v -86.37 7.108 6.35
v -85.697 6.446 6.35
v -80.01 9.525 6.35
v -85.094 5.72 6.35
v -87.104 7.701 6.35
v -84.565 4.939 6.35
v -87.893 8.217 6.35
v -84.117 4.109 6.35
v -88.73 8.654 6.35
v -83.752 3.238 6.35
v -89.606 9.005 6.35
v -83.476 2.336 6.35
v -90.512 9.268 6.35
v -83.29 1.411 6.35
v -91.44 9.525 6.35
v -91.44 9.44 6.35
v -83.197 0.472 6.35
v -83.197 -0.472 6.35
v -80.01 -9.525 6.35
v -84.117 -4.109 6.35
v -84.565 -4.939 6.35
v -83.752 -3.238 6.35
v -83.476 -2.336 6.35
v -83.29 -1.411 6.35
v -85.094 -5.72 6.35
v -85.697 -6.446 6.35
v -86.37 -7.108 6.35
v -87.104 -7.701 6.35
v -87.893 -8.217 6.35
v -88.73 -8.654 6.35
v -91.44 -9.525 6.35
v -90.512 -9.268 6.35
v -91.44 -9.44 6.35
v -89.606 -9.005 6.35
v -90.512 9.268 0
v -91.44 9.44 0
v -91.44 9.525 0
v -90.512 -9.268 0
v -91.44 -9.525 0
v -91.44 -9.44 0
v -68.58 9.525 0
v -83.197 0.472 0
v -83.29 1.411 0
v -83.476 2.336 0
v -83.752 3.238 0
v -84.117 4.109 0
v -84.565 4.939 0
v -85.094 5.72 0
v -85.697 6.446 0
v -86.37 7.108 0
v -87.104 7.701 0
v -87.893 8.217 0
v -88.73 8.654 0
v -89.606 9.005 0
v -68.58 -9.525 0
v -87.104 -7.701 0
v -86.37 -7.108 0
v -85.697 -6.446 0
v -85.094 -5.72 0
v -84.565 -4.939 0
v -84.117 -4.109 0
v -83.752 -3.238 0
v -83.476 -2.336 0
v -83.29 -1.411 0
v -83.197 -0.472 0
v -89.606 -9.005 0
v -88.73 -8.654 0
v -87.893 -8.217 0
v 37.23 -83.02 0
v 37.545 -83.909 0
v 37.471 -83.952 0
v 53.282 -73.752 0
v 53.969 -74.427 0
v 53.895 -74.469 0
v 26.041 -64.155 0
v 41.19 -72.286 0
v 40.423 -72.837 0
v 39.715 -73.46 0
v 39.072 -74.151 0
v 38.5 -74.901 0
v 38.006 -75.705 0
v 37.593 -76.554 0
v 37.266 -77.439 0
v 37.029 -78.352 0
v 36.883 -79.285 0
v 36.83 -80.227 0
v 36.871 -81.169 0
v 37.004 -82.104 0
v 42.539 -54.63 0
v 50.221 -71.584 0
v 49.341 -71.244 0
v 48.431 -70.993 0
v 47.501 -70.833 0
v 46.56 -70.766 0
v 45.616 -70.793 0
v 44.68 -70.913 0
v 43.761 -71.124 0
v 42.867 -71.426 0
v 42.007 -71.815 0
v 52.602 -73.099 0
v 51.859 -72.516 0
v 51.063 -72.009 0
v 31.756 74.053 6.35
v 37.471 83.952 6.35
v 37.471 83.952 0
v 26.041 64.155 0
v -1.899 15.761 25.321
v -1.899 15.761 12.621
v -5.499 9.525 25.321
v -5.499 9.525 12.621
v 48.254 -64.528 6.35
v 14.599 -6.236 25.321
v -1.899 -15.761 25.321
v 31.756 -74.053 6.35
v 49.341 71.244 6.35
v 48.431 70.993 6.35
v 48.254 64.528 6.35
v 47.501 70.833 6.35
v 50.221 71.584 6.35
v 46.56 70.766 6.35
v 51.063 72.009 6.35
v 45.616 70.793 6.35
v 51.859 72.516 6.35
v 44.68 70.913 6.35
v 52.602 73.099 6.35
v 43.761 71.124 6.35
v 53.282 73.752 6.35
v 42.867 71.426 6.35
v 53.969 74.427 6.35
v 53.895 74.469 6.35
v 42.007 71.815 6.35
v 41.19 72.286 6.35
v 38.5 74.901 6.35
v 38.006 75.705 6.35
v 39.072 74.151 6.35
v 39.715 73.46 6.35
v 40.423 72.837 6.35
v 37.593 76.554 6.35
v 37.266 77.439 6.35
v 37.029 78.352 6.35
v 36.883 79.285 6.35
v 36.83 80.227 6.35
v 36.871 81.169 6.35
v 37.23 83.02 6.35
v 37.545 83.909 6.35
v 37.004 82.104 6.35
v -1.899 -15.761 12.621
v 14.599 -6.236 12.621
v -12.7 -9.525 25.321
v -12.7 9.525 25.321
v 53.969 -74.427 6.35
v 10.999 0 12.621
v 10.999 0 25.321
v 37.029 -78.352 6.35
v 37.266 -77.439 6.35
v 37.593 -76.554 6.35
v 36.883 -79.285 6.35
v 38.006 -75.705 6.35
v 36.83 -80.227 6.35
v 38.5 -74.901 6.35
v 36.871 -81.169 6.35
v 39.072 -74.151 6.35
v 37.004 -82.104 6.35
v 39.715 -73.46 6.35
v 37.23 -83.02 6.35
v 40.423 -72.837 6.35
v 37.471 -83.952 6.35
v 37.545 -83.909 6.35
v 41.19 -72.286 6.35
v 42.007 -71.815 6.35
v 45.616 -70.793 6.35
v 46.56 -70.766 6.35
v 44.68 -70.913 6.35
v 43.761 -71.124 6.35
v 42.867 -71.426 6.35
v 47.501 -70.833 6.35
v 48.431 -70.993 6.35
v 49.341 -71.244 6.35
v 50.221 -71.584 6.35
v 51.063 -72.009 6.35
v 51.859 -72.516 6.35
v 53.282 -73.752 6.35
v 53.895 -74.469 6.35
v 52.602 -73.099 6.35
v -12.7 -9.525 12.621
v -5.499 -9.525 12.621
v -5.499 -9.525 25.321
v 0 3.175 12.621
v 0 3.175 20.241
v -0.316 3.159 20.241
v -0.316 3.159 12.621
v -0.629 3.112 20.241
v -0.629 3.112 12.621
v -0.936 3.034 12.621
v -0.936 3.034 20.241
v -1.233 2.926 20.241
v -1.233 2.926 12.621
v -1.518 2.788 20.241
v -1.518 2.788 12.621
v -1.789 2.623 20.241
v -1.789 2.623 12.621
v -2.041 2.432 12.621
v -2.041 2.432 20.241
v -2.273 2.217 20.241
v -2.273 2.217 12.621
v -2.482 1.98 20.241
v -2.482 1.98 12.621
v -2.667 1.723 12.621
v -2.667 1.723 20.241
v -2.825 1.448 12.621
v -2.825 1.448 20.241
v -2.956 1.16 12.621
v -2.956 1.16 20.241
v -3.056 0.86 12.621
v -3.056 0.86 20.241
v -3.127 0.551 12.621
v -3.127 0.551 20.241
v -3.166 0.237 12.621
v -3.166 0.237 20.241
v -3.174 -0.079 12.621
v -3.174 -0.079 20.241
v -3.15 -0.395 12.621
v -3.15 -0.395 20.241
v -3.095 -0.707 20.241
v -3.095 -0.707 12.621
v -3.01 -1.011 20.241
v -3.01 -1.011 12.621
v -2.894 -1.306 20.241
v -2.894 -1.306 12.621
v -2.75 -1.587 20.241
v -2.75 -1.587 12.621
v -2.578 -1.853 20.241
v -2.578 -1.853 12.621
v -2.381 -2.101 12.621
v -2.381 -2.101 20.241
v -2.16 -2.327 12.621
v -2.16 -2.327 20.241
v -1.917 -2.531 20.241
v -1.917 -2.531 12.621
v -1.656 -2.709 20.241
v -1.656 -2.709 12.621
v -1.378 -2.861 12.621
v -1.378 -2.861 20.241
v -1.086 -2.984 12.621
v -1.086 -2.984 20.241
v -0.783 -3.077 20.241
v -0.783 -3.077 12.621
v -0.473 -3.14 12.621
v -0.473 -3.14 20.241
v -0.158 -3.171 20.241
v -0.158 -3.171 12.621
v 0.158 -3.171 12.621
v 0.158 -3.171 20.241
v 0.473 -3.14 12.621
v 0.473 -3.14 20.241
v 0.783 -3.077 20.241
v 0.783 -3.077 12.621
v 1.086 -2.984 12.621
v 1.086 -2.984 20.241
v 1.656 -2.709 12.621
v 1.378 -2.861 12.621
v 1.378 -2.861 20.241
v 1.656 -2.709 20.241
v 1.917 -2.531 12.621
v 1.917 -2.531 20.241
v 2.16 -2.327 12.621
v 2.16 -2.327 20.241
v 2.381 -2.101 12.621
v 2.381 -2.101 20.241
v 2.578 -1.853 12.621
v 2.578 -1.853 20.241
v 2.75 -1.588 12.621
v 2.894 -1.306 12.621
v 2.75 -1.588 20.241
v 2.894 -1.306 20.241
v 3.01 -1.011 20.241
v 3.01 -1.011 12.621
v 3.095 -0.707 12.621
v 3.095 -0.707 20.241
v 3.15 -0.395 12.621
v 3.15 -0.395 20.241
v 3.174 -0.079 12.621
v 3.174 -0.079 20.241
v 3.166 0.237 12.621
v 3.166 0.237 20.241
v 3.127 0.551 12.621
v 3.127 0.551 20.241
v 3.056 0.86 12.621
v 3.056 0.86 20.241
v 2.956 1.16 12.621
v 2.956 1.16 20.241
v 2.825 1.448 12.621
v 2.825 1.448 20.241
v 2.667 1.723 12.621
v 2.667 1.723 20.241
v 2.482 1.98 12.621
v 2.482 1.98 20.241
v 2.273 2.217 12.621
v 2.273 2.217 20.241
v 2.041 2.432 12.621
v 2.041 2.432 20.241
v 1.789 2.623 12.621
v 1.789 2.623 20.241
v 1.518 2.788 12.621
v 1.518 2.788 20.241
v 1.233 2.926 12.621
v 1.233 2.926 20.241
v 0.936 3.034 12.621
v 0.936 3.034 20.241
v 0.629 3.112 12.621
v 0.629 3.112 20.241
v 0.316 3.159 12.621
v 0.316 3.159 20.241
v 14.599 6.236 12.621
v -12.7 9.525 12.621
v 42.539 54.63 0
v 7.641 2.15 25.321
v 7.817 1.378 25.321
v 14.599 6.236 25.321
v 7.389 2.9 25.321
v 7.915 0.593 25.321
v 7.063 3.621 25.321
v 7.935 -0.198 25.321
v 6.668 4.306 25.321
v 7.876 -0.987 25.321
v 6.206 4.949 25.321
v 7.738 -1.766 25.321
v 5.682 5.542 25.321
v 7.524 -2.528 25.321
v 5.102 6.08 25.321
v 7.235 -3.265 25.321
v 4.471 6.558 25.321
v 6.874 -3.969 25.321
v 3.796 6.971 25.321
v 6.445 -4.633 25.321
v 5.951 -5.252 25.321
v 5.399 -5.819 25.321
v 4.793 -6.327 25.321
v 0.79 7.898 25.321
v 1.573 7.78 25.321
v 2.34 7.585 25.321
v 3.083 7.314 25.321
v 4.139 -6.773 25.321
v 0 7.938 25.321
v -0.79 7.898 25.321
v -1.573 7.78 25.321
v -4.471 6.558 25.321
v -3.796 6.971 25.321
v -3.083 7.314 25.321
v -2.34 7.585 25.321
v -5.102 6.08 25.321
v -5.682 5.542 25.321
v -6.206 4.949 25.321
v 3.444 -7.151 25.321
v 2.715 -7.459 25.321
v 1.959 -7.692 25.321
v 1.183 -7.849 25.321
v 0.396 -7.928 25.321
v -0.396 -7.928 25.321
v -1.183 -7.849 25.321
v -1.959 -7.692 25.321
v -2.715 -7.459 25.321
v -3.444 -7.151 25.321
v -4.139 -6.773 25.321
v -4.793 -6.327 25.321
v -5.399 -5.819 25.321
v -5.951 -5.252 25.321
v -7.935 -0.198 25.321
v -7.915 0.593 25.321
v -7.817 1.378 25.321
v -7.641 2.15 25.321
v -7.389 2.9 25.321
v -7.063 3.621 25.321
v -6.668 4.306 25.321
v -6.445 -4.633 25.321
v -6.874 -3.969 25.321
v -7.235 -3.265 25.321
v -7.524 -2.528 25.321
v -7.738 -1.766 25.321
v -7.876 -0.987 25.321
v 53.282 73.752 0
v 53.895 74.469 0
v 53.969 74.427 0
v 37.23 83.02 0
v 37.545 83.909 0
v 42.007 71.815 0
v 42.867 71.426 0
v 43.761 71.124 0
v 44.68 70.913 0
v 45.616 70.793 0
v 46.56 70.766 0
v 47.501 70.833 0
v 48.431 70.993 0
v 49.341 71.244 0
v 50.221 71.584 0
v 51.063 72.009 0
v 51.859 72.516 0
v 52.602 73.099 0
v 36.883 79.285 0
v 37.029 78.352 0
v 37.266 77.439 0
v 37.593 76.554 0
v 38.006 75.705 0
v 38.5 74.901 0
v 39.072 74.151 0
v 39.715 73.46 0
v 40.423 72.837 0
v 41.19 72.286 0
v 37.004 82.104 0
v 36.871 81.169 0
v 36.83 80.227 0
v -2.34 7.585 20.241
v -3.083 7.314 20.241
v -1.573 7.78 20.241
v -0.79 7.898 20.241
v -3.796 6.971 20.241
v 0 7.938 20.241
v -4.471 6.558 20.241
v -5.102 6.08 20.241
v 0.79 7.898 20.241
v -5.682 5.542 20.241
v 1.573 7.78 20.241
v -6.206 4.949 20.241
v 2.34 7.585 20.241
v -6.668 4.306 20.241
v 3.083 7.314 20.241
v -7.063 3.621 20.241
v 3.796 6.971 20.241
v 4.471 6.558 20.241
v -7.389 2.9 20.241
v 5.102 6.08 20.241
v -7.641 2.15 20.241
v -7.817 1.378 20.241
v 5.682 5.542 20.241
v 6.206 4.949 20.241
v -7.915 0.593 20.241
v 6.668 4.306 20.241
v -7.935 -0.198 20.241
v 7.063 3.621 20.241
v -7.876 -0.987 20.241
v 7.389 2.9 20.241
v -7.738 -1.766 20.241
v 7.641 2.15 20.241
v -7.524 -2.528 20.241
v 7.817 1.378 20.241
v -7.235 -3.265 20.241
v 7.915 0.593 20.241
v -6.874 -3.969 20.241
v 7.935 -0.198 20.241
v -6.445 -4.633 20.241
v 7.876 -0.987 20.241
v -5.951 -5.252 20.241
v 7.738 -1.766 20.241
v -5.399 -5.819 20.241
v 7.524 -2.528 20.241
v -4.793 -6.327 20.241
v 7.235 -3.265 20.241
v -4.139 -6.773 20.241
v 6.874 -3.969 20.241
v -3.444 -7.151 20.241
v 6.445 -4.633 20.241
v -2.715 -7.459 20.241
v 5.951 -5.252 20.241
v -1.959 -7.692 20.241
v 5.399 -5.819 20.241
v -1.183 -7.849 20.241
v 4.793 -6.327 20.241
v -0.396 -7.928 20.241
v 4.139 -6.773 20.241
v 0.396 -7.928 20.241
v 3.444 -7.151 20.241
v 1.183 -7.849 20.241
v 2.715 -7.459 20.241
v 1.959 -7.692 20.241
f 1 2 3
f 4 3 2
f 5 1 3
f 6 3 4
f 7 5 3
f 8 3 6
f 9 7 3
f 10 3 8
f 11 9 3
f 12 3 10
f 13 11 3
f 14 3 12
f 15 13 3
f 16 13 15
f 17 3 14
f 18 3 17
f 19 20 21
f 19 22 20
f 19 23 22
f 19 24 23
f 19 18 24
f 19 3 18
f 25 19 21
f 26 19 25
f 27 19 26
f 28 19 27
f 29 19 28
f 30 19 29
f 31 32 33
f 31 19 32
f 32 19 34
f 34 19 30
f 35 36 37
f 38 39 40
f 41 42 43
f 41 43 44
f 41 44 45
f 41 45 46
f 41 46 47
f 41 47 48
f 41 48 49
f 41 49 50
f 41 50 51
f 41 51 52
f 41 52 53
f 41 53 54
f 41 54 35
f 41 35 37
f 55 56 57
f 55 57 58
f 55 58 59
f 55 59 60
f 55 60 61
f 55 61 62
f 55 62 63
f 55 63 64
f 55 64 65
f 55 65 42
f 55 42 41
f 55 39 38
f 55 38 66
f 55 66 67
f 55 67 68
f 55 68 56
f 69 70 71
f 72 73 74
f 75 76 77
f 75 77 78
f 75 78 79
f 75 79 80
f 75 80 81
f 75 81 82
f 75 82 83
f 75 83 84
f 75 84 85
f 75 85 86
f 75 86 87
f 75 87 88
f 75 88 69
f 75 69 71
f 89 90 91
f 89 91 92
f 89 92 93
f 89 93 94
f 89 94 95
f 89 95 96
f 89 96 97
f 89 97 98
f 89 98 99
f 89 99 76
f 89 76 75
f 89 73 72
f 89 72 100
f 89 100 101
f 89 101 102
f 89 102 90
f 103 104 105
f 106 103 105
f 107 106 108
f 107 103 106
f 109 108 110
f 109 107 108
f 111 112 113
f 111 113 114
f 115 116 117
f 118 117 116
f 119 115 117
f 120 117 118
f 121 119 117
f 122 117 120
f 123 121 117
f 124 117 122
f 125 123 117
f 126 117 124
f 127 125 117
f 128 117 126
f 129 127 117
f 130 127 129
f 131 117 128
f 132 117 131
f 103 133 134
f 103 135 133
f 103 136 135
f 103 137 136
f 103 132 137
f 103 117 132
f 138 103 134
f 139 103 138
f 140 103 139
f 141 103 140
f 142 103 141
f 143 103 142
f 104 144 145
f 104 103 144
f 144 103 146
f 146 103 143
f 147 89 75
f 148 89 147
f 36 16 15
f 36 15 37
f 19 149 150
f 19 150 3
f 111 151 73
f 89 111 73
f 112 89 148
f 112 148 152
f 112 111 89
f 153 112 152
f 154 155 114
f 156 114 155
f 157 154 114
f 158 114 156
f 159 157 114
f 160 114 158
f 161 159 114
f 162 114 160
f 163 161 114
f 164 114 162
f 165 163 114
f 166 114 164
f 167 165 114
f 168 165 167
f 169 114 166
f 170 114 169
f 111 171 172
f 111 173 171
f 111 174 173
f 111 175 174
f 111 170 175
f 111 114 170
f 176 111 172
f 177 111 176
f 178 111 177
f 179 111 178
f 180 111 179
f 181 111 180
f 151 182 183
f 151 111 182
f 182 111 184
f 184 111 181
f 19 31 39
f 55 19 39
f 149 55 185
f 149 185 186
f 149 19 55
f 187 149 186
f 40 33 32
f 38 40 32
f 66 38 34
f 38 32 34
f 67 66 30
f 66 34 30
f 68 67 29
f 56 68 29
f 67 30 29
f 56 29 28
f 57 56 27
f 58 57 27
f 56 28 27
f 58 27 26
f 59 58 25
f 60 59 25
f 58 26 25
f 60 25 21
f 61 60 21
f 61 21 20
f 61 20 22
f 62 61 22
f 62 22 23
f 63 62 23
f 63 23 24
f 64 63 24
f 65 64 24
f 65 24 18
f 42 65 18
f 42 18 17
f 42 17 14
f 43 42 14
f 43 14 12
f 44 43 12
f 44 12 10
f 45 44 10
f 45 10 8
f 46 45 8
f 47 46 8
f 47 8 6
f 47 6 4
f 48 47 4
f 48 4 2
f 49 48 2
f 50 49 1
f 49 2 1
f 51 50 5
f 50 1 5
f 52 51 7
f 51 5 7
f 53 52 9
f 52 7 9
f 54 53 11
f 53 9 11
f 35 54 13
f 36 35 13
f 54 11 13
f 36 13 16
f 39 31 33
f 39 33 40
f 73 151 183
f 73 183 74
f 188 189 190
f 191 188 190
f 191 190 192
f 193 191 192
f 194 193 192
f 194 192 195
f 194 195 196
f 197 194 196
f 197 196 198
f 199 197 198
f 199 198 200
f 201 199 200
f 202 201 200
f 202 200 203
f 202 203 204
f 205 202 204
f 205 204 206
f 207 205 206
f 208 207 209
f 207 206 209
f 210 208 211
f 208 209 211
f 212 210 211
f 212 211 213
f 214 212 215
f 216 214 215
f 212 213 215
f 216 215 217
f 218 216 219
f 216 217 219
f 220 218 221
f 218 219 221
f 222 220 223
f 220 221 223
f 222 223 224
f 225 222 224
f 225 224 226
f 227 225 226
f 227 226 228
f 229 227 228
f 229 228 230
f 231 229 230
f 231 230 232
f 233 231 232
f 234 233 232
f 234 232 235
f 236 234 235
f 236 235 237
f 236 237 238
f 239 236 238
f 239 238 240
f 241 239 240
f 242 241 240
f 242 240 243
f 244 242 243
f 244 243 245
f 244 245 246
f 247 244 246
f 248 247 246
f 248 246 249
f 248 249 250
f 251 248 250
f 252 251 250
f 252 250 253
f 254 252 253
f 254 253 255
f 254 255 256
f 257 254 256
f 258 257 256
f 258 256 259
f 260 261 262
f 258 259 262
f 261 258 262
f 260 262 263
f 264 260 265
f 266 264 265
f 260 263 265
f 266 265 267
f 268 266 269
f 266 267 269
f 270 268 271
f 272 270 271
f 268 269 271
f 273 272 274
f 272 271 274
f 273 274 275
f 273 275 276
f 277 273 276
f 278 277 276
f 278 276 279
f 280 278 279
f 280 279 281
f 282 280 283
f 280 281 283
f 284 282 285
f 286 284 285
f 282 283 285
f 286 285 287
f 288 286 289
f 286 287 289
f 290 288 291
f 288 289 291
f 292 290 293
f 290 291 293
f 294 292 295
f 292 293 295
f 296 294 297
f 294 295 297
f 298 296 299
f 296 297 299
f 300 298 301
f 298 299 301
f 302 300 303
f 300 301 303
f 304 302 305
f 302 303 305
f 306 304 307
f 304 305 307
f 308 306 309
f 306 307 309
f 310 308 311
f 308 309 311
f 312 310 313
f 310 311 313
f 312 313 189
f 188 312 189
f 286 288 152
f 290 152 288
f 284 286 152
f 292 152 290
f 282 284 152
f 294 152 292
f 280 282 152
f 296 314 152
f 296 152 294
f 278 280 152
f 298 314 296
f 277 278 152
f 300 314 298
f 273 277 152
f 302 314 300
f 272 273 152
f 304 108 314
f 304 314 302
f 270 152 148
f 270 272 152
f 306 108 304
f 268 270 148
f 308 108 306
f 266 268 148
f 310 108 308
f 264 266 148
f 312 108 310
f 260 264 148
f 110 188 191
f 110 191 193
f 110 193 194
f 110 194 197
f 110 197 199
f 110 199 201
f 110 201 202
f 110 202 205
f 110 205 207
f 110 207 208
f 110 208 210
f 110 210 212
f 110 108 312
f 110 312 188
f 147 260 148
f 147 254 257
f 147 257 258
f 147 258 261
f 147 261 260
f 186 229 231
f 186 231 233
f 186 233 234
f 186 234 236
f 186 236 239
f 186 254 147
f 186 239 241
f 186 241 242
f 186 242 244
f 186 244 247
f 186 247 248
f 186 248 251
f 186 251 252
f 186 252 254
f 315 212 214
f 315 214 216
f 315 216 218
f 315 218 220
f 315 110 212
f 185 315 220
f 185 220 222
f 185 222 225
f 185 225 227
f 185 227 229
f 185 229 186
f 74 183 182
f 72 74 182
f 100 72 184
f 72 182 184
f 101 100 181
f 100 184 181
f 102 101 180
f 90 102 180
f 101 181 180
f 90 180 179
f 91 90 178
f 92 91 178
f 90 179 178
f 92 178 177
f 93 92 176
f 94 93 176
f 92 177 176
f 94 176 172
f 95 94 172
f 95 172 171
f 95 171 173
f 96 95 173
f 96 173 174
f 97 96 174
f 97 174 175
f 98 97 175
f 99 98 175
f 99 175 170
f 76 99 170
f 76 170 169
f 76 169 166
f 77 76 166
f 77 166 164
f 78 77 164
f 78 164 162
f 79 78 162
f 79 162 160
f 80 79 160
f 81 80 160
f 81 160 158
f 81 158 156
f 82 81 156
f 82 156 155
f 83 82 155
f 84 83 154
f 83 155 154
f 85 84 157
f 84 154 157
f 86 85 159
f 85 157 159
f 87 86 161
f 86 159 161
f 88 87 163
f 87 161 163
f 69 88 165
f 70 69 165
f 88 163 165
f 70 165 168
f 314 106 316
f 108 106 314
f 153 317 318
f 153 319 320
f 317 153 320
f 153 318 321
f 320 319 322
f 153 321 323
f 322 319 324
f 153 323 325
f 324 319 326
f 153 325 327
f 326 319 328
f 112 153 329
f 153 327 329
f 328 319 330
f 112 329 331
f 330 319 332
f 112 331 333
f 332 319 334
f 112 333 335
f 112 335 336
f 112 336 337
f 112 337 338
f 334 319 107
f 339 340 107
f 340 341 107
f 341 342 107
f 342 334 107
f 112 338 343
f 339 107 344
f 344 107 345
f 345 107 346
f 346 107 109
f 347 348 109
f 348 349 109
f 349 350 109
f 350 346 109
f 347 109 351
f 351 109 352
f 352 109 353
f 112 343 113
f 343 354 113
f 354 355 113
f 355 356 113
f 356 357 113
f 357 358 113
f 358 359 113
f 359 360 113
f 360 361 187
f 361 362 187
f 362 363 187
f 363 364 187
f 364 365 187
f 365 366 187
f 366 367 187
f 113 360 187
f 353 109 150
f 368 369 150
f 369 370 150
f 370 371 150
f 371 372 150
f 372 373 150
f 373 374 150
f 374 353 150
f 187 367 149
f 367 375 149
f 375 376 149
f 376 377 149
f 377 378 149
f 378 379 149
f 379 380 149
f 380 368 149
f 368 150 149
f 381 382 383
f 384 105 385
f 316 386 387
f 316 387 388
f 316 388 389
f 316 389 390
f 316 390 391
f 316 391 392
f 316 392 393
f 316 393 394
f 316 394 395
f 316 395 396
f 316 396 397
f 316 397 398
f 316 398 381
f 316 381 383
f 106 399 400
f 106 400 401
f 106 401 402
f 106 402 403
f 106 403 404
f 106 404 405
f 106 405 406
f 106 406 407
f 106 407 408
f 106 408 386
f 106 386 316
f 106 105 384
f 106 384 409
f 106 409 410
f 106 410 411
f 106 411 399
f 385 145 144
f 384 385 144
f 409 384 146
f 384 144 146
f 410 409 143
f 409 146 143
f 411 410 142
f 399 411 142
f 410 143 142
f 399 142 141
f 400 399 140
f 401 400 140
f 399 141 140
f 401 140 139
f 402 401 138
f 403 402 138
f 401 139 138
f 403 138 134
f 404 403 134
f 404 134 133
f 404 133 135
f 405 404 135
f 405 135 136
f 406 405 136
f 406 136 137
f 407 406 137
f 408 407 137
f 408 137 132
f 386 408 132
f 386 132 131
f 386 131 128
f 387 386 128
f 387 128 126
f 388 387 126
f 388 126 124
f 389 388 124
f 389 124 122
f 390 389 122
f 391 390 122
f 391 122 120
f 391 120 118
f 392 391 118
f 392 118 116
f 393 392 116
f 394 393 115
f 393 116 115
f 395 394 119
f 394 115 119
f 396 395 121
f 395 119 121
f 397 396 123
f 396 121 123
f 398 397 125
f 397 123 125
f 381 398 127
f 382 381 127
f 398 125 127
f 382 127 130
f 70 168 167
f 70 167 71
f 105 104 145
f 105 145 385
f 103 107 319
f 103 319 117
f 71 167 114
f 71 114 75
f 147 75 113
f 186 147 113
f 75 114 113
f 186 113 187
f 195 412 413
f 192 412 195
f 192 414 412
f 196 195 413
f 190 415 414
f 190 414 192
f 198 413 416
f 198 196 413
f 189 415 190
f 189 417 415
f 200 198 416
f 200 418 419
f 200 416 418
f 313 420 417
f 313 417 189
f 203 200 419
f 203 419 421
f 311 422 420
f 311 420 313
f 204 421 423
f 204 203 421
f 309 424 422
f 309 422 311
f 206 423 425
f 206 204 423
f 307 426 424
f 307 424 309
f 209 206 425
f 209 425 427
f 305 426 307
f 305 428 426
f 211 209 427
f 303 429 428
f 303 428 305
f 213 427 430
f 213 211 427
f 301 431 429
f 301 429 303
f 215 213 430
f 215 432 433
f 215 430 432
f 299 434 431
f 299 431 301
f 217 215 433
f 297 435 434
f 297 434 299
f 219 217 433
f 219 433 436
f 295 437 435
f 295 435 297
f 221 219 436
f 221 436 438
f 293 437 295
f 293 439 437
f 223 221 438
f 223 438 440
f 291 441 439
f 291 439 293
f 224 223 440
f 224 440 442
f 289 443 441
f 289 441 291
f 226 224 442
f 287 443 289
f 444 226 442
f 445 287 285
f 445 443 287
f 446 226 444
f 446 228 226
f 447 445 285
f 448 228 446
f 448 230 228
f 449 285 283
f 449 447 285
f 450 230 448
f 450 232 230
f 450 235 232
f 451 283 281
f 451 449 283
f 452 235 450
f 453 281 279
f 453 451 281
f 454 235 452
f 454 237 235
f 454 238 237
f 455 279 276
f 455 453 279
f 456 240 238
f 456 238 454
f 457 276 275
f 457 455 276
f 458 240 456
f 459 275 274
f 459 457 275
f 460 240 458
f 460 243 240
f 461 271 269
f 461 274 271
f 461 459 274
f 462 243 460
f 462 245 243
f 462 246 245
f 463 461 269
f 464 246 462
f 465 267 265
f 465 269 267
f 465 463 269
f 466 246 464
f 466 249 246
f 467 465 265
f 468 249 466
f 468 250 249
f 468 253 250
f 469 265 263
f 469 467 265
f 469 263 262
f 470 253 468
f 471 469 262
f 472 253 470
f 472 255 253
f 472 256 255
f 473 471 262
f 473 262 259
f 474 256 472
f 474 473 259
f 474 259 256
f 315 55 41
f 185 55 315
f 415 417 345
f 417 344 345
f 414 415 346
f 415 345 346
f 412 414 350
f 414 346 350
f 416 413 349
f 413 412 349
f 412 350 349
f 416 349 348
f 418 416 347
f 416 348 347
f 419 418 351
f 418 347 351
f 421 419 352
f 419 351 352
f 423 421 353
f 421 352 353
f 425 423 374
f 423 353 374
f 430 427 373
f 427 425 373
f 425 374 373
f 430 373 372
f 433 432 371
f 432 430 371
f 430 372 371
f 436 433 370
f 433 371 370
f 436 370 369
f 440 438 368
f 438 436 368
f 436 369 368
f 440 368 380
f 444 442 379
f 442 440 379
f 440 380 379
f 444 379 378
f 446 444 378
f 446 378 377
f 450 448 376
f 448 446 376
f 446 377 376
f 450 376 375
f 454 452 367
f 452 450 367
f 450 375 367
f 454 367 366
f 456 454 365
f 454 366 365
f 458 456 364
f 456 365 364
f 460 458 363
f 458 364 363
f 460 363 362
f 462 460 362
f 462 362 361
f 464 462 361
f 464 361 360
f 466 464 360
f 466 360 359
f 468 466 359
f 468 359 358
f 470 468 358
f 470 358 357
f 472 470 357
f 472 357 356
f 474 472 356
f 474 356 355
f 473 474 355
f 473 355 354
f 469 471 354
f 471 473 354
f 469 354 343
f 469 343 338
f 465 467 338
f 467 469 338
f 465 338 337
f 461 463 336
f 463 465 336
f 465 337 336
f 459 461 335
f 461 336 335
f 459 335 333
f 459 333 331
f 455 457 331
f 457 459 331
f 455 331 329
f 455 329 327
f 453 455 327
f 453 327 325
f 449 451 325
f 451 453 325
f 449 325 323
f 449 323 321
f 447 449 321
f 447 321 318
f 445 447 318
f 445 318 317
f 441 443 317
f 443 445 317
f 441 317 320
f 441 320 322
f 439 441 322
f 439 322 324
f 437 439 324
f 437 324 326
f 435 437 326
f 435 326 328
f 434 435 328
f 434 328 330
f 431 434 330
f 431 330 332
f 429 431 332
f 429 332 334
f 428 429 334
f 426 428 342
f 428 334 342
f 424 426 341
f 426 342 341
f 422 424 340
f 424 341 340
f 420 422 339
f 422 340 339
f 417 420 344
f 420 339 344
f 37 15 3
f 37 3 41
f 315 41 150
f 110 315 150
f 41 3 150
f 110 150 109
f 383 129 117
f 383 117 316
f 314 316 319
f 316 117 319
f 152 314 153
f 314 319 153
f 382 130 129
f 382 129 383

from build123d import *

# Parameters (mm, degrees)
F1_DEPTH  = 9.525
F3_DEPTH  = 6.351
F0_W      = 12.7
F0_H      = 12.7
F4_DEPTH  = 9.525
F6_DEPTH  = 5.08
F8_DEPTH  = 25.4
F10_COUNT = 3


with BuildPart() as f1:
    # F0 (on Front) → F1 (new body, symmetric)
    with BuildSketch(Plane.XZ):
        Polygon((-91.44, 0), (-68.58, 0), (-68.58, 6.35), (-80.01, 6.35), (-91.44, 6.35), align=None)
        Polygon((-68.58, 6.35), (-68.58, 0), (-12.7, 12.621443), (-12.7, 25.321443), (-80.01, 6.35), align=None)
    extrude(amount=F1_DEPTH, both=True)

    # F2 (on face) → F3 (cut, through all)
    with BuildSketch(Plane.XY.offset(6.35)):
        with BuildLine():
            Line((-91.44, 9.439954), (-91.44, -9.439954))
            ThreePointArc((-91.44, -9.439954), (-83.185, 0), (-91.44, 9.439954))
        make_face()
    extrude(amount=-F3_DEPTH, mode=Mode.SUBTRACT)

    # F0 (on Front) → F4 (join, symmetric)
    with BuildSketch(Plane.XZ):
        with Locations((-6.35, 18.971443)):
            Rectangle(F0_W, F0_H)
    extrude(amount=F4_DEPTH, both=True)

    # F5 (on face) → F6 (cut)
    with BuildSketch(Plane.XY.offset(25.321443)):
        with BuildLine():
            Line((0, -7.9375), (0, 7.9375))
            ThreePointArc((0, 7.9375), (-7.9375, 0), (0, -7.9375))
        make_face()
    extrude(amount=-F6_DEPTH, mode=Mode.SUBTRACT)

    # F7 (on face) → F8 (cut)
    with BuildSketch(Plane.XY.offset(20.241443)):
        with BuildLine():
            Line((0, -3.175), (0, 3.175))
            ThreePointArc((0, 3.175), (-3.175, 0), (0, -3.175))
        make_face()
    extrude(amount=-F8_DEPTH, mode=Mode.SUBTRACT)

    # F10: F1 ×3 about axis
    f10_axis = Axis((0, 0, 19.108918), (0, 0, 1))


with BuildPart() as f1_1:
    add(f1.part)
    for i in range(1, F10_COUNT):
        add(f1.part.rotate(f10_axis, i * 360 / F10_COUNT))


solid = f1_1.part
